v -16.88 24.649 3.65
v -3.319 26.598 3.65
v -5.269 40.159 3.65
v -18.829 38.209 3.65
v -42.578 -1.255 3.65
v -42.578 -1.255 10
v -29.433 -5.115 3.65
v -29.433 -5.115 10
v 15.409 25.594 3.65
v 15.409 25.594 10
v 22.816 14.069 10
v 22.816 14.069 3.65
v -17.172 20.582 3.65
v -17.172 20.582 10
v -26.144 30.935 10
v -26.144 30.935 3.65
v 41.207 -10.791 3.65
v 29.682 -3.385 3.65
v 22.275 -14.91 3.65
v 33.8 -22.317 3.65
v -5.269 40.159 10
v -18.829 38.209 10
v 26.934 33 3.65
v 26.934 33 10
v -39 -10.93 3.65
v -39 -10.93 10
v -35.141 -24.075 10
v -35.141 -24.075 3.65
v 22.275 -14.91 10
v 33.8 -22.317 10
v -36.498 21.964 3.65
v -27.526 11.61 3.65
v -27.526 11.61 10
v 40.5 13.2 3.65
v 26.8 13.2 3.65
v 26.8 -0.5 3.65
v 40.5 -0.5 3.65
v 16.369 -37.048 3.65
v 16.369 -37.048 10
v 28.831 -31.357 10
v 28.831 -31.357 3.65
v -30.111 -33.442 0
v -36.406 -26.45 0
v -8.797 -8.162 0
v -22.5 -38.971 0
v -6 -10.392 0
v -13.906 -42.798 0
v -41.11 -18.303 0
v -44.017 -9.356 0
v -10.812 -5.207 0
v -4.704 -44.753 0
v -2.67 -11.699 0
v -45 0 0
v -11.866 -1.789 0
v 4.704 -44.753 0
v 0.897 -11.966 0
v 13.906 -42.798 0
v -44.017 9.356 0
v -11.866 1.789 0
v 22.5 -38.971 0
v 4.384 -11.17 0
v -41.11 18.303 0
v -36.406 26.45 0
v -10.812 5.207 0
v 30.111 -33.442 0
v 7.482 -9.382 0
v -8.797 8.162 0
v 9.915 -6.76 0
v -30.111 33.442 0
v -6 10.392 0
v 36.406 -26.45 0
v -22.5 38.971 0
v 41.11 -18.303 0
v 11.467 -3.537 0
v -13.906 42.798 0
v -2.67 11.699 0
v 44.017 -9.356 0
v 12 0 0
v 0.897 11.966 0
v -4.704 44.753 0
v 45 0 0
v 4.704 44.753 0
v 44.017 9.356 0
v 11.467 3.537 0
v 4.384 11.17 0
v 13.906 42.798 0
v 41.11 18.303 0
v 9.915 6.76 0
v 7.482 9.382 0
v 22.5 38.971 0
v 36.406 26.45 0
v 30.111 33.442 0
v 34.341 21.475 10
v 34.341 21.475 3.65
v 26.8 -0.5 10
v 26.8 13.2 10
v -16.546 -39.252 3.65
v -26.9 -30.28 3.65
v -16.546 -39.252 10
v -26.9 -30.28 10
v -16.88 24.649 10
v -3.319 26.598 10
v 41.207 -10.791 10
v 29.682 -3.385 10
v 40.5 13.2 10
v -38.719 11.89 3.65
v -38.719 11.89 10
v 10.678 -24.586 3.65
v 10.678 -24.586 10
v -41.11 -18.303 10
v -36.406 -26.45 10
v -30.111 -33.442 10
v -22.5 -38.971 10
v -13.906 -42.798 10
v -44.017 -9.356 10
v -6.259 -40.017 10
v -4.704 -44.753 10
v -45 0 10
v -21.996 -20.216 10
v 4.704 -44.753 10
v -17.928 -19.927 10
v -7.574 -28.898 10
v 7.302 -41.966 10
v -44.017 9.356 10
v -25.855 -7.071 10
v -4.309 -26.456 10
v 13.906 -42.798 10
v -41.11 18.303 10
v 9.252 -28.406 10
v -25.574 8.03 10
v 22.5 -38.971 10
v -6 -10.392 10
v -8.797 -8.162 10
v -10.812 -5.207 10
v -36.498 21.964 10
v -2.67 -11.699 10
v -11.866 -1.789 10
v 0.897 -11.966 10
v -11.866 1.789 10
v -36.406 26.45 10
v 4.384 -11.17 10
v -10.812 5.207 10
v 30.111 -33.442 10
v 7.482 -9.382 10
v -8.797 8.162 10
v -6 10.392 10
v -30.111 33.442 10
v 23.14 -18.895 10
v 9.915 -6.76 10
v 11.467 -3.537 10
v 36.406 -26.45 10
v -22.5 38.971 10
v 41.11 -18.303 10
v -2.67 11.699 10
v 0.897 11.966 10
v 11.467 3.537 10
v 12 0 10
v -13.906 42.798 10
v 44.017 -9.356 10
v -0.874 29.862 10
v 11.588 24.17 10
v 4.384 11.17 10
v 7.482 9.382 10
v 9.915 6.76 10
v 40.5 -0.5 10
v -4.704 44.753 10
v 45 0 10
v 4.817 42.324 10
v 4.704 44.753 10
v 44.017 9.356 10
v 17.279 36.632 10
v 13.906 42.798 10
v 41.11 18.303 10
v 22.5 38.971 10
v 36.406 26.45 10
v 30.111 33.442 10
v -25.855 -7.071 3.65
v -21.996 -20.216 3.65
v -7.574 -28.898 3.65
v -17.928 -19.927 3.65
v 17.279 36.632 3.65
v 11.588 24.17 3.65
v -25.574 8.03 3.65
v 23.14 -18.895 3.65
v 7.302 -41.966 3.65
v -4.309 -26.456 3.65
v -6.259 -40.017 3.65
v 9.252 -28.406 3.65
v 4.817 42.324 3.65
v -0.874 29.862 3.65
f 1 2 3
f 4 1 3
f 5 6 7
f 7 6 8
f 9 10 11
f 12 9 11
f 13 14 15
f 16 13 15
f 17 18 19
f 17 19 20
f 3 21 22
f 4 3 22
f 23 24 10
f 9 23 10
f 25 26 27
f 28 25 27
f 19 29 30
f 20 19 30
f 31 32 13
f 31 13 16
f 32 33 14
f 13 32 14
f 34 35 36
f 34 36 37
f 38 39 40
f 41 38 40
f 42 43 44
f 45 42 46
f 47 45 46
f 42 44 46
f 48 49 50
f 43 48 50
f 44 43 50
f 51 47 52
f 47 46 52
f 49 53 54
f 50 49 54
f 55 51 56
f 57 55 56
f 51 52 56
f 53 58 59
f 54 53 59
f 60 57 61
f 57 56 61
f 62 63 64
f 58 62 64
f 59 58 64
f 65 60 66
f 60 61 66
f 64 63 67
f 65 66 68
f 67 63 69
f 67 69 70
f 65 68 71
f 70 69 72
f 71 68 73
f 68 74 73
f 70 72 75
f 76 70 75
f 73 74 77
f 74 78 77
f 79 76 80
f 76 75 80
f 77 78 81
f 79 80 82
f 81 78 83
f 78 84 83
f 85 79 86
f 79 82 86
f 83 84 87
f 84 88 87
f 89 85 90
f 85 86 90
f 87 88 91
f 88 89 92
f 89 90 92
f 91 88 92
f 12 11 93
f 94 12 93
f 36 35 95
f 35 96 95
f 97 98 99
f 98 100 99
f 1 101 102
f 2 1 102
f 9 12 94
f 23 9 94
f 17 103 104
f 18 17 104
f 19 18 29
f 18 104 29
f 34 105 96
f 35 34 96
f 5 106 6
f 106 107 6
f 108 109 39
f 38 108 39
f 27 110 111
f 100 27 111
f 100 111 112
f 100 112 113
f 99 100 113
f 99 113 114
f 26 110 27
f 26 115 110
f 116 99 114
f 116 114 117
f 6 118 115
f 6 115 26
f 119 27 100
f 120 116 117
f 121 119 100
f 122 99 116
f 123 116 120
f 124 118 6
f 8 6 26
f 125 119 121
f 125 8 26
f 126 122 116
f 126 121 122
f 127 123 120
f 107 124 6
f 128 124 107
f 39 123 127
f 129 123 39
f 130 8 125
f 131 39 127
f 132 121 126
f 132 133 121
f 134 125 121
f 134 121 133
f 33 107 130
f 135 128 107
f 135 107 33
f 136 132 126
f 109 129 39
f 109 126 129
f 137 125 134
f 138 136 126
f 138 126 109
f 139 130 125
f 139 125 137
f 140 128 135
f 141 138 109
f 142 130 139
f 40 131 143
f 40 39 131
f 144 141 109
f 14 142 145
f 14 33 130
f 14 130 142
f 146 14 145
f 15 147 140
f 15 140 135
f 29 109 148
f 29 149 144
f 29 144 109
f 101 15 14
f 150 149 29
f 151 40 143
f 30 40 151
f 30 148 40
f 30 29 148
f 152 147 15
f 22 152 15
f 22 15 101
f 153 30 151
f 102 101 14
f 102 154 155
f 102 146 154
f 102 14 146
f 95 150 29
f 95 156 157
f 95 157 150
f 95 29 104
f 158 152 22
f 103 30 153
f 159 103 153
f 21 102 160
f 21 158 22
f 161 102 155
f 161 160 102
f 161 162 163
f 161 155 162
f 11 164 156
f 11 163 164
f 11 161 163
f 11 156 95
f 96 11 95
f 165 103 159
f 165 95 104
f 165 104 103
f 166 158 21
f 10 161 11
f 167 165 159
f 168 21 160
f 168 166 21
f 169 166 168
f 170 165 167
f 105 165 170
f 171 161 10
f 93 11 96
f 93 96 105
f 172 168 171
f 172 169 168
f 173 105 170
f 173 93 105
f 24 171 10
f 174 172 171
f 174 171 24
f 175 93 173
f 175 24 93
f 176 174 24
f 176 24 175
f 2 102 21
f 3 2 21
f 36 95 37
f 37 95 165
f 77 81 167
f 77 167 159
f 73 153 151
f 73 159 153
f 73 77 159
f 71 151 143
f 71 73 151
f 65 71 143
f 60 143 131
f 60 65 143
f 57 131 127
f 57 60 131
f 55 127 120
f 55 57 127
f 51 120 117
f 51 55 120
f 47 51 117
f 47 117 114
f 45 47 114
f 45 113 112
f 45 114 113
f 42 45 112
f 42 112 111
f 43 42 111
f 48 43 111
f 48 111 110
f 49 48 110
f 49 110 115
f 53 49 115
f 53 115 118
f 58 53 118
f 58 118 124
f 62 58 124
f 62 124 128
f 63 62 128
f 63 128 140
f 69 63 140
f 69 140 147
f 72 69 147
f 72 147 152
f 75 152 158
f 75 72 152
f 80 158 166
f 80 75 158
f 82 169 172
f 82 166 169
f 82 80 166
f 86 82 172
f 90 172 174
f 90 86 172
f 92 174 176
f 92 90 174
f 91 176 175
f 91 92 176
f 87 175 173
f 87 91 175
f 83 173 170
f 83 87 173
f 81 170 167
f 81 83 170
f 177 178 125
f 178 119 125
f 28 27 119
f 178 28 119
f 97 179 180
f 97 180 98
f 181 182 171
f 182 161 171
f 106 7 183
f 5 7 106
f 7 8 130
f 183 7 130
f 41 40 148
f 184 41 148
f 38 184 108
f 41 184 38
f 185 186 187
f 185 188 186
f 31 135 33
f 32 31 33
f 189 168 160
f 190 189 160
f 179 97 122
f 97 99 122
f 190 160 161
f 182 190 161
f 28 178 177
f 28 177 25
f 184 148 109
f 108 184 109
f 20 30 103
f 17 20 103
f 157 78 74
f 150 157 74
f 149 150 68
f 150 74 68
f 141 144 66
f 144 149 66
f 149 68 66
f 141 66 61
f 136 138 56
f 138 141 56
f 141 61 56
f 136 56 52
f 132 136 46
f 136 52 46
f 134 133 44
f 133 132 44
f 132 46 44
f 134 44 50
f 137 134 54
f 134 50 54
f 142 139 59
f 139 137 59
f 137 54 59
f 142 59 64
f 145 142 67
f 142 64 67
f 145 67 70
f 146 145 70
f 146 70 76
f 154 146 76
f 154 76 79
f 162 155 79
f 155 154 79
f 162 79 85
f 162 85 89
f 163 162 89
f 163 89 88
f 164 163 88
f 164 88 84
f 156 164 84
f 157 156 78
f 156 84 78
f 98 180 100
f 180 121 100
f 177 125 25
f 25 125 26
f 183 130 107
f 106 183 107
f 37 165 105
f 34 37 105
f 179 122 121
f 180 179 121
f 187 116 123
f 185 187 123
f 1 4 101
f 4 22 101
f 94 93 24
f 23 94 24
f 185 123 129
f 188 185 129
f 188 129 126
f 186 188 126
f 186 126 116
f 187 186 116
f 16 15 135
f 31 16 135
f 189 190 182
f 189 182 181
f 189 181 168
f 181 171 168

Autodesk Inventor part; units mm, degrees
ref_plane "YZ Plane" through (0, 0, 0) normal (1, 0, 0) x (0, 1, 0)
ref_plane "XZ Plane" through (0, 0, 0) normal (0, 1, 0) x (-1, 0, 0)
ref_plane "XY Plane" through (0, 0, 0) normal (0, 0, 1) x (1, 0, 0)
sketch "Sketch1" plane through (0, 0, 0) normal (0, 0, 1) x (1, 0, 0)
  circle A0 centre (0, 0) radius 45
  circle A1 centre (0, 0) radius 12
  dimension "d0" = 90
  dimension "d1" = 24
extrude "Extrusion1" add sketch "Sketch1" along normal blind 10
sketch "Sketch2" plane through (0, 0, 10) normal (0, 0, 1) x (1, 0, 0)
  line L0 (27.3, 12.7) -> (40, 12.7)
  line L1 (40, 12.7) -> (40, 0)
  line L2 (40, 0) -> (27.3, 0)
  line L3 (27.3, 0) -> (27.3, 12.7)
  line L4 (40.5, 13.2) -> (26.8, 13.2)
  line L5 (26.8, 13.2) -> (26.8, -0.5)
  line L6 (26.8, -0.5) -> (40.5, -0.5)
  line L7 (40.5, -0.5) -> (40.5, 13.2)
  point P0 (0, 0)
  dimension "d4" = 12.7
  dimension "d5" = 12.7
  dimension "d6" = 40
  dimension "d7" = 0.5
extrude "Extrusion2" cut sketch "Sketch2" against normal blind 6.35 contours L0 L1 L2 L3 | L7 L6 L5 L4
pattern_circular "Circular Pattern1" count 11 over 360 about axis through (0, 0, 0) along (0, 0, 1) of "Extrusion2"
sketch "Sketch3" plane through (0, 0, 10) normal (0, 0, 1) x (1, 0, 0)
  circle A0 centre (20, 0) radius 1.75
  circle A1 centre (14.1421, 14.1421) radius 1.75
  circle A2 centre (0, 20) radius 1.75
  circle A3 centre (-14.1421, 14.1421) radius 1.75
  circle A4 centre (-20, 0) radius 1.75
  circle A5 centre (-14.1421, -14.1421) radius 1.75
  circle A6 centre (0, -20) radius 1.75
  circle A7 centre (14.1421, -14.1421) radius 1.75
  point P0 (0, 0)
  dimension "d13" = 3.5
  dimension "d14" = 20
  dimension "d17" = 360
extrude "Extrusion3" [suppressed]
properties part number "SG01" material "ABS Plastic"
